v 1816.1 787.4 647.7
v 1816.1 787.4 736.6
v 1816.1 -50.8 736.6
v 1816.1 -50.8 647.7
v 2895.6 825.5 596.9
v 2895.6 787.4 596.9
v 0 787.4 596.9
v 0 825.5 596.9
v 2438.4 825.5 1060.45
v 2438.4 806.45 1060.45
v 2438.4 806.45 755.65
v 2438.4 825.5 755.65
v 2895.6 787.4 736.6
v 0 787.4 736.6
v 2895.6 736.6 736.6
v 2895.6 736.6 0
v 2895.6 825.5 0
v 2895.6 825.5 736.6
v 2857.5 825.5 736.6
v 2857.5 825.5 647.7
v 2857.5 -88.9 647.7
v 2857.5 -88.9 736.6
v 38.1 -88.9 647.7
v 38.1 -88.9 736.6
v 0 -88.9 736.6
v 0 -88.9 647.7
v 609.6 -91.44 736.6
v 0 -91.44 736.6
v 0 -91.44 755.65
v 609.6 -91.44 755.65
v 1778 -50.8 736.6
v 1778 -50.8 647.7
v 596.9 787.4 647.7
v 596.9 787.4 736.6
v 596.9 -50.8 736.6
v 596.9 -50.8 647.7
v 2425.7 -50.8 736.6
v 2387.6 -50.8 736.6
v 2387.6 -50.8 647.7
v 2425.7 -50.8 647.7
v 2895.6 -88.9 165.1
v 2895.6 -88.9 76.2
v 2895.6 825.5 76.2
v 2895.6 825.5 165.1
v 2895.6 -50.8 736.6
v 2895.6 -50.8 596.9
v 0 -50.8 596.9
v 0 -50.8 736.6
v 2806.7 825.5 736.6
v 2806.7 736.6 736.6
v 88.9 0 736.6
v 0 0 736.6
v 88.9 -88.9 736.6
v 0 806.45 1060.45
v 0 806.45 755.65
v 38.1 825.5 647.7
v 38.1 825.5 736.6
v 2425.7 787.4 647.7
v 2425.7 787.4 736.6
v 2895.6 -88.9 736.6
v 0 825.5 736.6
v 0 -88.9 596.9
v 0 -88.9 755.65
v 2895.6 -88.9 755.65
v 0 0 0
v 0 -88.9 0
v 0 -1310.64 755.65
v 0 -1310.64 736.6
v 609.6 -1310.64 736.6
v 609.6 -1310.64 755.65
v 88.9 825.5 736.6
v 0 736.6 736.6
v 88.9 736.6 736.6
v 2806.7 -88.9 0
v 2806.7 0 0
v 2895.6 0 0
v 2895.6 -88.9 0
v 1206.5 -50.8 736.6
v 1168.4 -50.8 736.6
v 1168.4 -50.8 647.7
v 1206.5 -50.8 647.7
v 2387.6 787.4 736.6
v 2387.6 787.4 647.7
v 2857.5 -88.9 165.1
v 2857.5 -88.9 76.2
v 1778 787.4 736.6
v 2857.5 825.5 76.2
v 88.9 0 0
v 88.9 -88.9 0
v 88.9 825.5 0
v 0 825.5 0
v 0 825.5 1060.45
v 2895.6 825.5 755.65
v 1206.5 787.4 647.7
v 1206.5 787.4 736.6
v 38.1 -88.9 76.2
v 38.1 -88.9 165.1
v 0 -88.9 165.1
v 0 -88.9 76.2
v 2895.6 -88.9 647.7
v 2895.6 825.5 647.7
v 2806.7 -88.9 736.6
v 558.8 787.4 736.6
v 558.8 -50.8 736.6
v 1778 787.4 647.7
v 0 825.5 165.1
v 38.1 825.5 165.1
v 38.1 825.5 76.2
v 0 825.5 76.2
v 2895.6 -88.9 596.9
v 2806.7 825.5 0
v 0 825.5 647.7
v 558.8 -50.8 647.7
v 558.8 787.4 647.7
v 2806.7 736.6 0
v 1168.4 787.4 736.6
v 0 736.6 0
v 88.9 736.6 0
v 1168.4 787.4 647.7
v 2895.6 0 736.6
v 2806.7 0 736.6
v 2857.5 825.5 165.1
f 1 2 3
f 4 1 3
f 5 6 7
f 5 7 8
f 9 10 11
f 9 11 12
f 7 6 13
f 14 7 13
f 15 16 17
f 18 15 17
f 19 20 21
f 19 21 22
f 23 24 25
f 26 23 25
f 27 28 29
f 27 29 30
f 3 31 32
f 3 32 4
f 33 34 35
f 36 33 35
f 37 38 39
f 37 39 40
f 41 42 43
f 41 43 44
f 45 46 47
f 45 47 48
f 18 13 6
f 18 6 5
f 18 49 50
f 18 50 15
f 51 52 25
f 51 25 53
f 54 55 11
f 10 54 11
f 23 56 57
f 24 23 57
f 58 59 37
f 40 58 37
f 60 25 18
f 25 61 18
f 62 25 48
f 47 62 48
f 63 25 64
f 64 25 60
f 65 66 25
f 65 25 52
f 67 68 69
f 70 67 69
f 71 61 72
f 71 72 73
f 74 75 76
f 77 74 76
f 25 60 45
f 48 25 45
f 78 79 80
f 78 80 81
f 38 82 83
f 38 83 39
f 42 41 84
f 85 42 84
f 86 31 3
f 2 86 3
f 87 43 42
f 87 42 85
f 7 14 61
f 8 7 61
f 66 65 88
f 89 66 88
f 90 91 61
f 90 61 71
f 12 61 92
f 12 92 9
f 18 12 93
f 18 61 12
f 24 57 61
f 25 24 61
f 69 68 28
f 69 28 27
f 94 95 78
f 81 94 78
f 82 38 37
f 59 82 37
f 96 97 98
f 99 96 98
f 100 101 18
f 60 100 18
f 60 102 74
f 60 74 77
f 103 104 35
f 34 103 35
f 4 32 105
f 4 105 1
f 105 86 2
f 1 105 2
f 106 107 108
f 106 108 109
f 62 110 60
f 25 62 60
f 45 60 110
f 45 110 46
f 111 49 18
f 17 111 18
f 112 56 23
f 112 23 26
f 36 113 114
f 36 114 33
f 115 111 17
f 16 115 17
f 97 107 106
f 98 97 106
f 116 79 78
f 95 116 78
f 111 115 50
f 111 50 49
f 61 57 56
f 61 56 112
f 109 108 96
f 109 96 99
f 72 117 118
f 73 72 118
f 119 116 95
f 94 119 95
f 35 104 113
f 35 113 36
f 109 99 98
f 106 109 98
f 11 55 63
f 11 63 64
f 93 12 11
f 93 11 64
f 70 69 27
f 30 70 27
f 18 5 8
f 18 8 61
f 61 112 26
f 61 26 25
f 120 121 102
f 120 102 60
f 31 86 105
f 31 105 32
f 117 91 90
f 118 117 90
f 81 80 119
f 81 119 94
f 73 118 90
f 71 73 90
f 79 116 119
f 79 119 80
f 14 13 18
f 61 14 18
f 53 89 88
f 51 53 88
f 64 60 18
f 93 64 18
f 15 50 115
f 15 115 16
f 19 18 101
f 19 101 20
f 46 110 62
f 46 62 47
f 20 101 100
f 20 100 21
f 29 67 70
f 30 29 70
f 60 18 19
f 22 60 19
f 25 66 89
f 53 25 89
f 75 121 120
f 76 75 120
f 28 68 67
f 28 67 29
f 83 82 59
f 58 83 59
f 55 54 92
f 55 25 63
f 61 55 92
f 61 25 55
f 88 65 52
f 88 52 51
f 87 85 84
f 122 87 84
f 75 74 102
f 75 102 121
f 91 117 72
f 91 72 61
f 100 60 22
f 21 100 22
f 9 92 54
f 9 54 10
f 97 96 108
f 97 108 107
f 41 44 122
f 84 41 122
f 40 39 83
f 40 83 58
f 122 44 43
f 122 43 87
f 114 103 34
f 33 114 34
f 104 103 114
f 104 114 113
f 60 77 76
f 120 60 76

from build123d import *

# Parameters (mm, degrees)
F0_W      = 88.9
F0_H      = 88.9
F1_DEPTH  = 736.6
F2_W      = 88.9
F2_H      = 88.9
F3_DEPTH  = 19.05
F2_W_2    = 609.6
F2_H_2    = 1219.2
F4_W      = 38.1
F4_H      = 88.9
F5_DEPTH  = 914.4
F6_W      = 38.1
F6_H      = 139.7
F7_DEPTH  = 2895.6
F8_W      = 38.1
F8_H      = 838.2
F9_DEPTH  = 88.9
F10_W     = 2438.4
F10_H     = 19.05
F11_DEPTH = 304.8


with BuildPart() as f1:
    # F0 (on Top) → F1 (new body)
    with BuildSketch(Plane.XY):
        with Locations((44.45, -44.45)):
            Rectangle(F0_W, F0_H)
    extrude(amount=F1_DEPTH)


with BuildPart() as f1b:
    # F0 (on Top) → F1, piece 2 (new body)
    with BuildSketch(Plane.XY):
        with Locations((44.45, 781.05)):
            Rectangle(F0_W, F0_H)
    extrude(amount=F1_DEPTH)


with BuildPart() as f1c:
    # F0 (on Top) → F1, piece 3 (new body)
    with BuildSketch(Plane.XY):
        with Locations((2851.15, -44.45)):
            Rectangle(F0_W, F0_H)
    extrude(amount=F1_DEPTH)


with BuildPart() as f1d:
    # F0 (on Top) → F1, piece 4 (new body)
    with BuildSketch(Plane.XY):
        with Locations((2851.15, 781.05)):
            Rectangle(F0_W, F0_H)
    extrude(amount=F1_DEPTH)


with BuildPart() as f3:
    # F2 (on face) → F3 (new body)
    with BuildSketch(Plane.XY.offset(736.6)):
        with Locations((44.45, -44.45)):
            Rectangle(F2_W, F2_H)
        Polygon((88.9, 0), (88.9, -88.9), (2895.6, -88.9), (2895.6, 825.5), (0, 825.5), (0, 0), align=None)
    extrude(amount=F3_DEPTH)

    # F10 (on face) → F11 (join)
    with BuildSketch(Plane.XY.offset(755.65)):
        with Locations((1219.2, 815.975)):
            Rectangle(F10_W, F10_H)
    extrude(amount=F11_DEPTH)


with BuildPart() as f3b:
    # F2 (on face) → F3, piece 2 (new body)
    with BuildSketch(Plane.XY.offset(736.6)):
        with Locations((304.8, -701.04)):
            Rectangle(F2_W_2, F2_H_2)
    extrude(amount=F3_DEPTH)


with BuildPart() as f5:
    # F4 (on face) → F5 (new body, through all)
    with BuildSketch(Plane(origin=(0, 825.5, 0), x_dir=(-1, 0, 0), z_dir=(0, 1, 0))):
        with Locations((-2876.55, 692.15)):
            Rectangle(F4_W, F4_H)
    extrude(amount=-F5_DEPTH)


with BuildPart() as f5b:
    # F4 (on face) → F5, piece 2 (new body, through all)
    with BuildSketch(Plane(origin=(0, 825.5, 0), x_dir=(-1, 0, 0), z_dir=(0, 1, 0))):
        with Locations((-2876.55, 120.65)):
            Rectangle(F4_W, F4_H)
    extrude(amount=-F5_DEPTH)


with BuildPart() as f5c:
    # F4 (on face) → F5, piece 3 (new body, through all)
    with BuildSketch(Plane(origin=(0, 825.5, 0), x_dir=(-1, 0, 0), z_dir=(0, 1, 0))):
        with Locations((-19.05, 692.15)):
            Rectangle(F4_W, F4_H)
    extrude(amount=-F5_DEPTH)


with BuildPart() as f5d:
    # F4 (on face) → F5, piece 4 (new body, through all)
    with BuildSketch(Plane(origin=(0, 825.5, 0), x_dir=(-1, 0, 0), z_dir=(0, 1, 0))):
        with Locations((-19.05, 120.65)):
            Rectangle(F4_W, F4_H)
    extrude(amount=-F5_DEPTH)


with BuildPart() as f7:
    # F6 (on face) → F7 (new body, through all)
    with BuildSketch(Plane.YZ.offset(2895.6)):
        with Locations((-69.85, 666.75)):
            Rectangle(F6_W, F6_H)
    extrude(amount=-F7_DEPTH)


with BuildPart() as f7b:
    # F6 (on face) → F7, piece 2 (new body, through all)
    with BuildSketch(Plane.YZ.offset(2895.6)):
        with Locations((806.45, 666.75)):
            Rectangle(F6_W, F6_H)
    extrude(amount=-F7_DEPTH)


with BuildPart() as f9:
    # F8 (on face) → F9 (new body)
    with BuildSketch(Plane(origin=(0, 0, 736.6), x_dir=(1, 0, 0), z_dir=(0, 0, -1))):
        with Locations((577.85, -368.3)):
            Rectangle(F8_W, F8_H)
    extrude(amount=F9_DEPTH)


with BuildPart() as f9b:
    # F8 (on face) → F9, piece 2 (new body)
    with BuildSketch(Plane(origin=(0, 0, 736.6), x_dir=(1, 0, 0), z_dir=(0, 0, -1))):
        with Locations((1187.45, -368.3)):
            Rectangle(F8_W, F8_H)
    extrude(amount=F9_DEPTH)


with BuildPart() as f9c:
    # F8 (on face) → F9, piece 3 (new body)
    with BuildSketch(Plane(origin=(0, 0, 736.6), x_dir=(1, 0, 0), z_dir=(0, 0, -1))):
        with Locations((1797.05, -368.3)):
            Rectangle(F8_W, F8_H)
    extrude(amount=F9_DEPTH)


with BuildPart() as f9d:
    # F8 (on face) → F9, piece 4 (new body)
    with BuildSketch(Plane(origin=(0, 0, 736.6), x_dir=(1, 0, 0), z_dir=(0, 0, -1))):
        with Locations((2406.65, -368.3)):
            Rectangle(F8_W, F8_H)
    extrude(amount=F9_DEPTH)


solid = Compound([f1.part, f1b.part, f1c.part, f1d.part, f3.part, f3b.part, f5.part, f5b.part, f5c.part, f5d.part, f7.part, f7b.part, f9.part, f9b.part, f9c.part, f9d.part])
